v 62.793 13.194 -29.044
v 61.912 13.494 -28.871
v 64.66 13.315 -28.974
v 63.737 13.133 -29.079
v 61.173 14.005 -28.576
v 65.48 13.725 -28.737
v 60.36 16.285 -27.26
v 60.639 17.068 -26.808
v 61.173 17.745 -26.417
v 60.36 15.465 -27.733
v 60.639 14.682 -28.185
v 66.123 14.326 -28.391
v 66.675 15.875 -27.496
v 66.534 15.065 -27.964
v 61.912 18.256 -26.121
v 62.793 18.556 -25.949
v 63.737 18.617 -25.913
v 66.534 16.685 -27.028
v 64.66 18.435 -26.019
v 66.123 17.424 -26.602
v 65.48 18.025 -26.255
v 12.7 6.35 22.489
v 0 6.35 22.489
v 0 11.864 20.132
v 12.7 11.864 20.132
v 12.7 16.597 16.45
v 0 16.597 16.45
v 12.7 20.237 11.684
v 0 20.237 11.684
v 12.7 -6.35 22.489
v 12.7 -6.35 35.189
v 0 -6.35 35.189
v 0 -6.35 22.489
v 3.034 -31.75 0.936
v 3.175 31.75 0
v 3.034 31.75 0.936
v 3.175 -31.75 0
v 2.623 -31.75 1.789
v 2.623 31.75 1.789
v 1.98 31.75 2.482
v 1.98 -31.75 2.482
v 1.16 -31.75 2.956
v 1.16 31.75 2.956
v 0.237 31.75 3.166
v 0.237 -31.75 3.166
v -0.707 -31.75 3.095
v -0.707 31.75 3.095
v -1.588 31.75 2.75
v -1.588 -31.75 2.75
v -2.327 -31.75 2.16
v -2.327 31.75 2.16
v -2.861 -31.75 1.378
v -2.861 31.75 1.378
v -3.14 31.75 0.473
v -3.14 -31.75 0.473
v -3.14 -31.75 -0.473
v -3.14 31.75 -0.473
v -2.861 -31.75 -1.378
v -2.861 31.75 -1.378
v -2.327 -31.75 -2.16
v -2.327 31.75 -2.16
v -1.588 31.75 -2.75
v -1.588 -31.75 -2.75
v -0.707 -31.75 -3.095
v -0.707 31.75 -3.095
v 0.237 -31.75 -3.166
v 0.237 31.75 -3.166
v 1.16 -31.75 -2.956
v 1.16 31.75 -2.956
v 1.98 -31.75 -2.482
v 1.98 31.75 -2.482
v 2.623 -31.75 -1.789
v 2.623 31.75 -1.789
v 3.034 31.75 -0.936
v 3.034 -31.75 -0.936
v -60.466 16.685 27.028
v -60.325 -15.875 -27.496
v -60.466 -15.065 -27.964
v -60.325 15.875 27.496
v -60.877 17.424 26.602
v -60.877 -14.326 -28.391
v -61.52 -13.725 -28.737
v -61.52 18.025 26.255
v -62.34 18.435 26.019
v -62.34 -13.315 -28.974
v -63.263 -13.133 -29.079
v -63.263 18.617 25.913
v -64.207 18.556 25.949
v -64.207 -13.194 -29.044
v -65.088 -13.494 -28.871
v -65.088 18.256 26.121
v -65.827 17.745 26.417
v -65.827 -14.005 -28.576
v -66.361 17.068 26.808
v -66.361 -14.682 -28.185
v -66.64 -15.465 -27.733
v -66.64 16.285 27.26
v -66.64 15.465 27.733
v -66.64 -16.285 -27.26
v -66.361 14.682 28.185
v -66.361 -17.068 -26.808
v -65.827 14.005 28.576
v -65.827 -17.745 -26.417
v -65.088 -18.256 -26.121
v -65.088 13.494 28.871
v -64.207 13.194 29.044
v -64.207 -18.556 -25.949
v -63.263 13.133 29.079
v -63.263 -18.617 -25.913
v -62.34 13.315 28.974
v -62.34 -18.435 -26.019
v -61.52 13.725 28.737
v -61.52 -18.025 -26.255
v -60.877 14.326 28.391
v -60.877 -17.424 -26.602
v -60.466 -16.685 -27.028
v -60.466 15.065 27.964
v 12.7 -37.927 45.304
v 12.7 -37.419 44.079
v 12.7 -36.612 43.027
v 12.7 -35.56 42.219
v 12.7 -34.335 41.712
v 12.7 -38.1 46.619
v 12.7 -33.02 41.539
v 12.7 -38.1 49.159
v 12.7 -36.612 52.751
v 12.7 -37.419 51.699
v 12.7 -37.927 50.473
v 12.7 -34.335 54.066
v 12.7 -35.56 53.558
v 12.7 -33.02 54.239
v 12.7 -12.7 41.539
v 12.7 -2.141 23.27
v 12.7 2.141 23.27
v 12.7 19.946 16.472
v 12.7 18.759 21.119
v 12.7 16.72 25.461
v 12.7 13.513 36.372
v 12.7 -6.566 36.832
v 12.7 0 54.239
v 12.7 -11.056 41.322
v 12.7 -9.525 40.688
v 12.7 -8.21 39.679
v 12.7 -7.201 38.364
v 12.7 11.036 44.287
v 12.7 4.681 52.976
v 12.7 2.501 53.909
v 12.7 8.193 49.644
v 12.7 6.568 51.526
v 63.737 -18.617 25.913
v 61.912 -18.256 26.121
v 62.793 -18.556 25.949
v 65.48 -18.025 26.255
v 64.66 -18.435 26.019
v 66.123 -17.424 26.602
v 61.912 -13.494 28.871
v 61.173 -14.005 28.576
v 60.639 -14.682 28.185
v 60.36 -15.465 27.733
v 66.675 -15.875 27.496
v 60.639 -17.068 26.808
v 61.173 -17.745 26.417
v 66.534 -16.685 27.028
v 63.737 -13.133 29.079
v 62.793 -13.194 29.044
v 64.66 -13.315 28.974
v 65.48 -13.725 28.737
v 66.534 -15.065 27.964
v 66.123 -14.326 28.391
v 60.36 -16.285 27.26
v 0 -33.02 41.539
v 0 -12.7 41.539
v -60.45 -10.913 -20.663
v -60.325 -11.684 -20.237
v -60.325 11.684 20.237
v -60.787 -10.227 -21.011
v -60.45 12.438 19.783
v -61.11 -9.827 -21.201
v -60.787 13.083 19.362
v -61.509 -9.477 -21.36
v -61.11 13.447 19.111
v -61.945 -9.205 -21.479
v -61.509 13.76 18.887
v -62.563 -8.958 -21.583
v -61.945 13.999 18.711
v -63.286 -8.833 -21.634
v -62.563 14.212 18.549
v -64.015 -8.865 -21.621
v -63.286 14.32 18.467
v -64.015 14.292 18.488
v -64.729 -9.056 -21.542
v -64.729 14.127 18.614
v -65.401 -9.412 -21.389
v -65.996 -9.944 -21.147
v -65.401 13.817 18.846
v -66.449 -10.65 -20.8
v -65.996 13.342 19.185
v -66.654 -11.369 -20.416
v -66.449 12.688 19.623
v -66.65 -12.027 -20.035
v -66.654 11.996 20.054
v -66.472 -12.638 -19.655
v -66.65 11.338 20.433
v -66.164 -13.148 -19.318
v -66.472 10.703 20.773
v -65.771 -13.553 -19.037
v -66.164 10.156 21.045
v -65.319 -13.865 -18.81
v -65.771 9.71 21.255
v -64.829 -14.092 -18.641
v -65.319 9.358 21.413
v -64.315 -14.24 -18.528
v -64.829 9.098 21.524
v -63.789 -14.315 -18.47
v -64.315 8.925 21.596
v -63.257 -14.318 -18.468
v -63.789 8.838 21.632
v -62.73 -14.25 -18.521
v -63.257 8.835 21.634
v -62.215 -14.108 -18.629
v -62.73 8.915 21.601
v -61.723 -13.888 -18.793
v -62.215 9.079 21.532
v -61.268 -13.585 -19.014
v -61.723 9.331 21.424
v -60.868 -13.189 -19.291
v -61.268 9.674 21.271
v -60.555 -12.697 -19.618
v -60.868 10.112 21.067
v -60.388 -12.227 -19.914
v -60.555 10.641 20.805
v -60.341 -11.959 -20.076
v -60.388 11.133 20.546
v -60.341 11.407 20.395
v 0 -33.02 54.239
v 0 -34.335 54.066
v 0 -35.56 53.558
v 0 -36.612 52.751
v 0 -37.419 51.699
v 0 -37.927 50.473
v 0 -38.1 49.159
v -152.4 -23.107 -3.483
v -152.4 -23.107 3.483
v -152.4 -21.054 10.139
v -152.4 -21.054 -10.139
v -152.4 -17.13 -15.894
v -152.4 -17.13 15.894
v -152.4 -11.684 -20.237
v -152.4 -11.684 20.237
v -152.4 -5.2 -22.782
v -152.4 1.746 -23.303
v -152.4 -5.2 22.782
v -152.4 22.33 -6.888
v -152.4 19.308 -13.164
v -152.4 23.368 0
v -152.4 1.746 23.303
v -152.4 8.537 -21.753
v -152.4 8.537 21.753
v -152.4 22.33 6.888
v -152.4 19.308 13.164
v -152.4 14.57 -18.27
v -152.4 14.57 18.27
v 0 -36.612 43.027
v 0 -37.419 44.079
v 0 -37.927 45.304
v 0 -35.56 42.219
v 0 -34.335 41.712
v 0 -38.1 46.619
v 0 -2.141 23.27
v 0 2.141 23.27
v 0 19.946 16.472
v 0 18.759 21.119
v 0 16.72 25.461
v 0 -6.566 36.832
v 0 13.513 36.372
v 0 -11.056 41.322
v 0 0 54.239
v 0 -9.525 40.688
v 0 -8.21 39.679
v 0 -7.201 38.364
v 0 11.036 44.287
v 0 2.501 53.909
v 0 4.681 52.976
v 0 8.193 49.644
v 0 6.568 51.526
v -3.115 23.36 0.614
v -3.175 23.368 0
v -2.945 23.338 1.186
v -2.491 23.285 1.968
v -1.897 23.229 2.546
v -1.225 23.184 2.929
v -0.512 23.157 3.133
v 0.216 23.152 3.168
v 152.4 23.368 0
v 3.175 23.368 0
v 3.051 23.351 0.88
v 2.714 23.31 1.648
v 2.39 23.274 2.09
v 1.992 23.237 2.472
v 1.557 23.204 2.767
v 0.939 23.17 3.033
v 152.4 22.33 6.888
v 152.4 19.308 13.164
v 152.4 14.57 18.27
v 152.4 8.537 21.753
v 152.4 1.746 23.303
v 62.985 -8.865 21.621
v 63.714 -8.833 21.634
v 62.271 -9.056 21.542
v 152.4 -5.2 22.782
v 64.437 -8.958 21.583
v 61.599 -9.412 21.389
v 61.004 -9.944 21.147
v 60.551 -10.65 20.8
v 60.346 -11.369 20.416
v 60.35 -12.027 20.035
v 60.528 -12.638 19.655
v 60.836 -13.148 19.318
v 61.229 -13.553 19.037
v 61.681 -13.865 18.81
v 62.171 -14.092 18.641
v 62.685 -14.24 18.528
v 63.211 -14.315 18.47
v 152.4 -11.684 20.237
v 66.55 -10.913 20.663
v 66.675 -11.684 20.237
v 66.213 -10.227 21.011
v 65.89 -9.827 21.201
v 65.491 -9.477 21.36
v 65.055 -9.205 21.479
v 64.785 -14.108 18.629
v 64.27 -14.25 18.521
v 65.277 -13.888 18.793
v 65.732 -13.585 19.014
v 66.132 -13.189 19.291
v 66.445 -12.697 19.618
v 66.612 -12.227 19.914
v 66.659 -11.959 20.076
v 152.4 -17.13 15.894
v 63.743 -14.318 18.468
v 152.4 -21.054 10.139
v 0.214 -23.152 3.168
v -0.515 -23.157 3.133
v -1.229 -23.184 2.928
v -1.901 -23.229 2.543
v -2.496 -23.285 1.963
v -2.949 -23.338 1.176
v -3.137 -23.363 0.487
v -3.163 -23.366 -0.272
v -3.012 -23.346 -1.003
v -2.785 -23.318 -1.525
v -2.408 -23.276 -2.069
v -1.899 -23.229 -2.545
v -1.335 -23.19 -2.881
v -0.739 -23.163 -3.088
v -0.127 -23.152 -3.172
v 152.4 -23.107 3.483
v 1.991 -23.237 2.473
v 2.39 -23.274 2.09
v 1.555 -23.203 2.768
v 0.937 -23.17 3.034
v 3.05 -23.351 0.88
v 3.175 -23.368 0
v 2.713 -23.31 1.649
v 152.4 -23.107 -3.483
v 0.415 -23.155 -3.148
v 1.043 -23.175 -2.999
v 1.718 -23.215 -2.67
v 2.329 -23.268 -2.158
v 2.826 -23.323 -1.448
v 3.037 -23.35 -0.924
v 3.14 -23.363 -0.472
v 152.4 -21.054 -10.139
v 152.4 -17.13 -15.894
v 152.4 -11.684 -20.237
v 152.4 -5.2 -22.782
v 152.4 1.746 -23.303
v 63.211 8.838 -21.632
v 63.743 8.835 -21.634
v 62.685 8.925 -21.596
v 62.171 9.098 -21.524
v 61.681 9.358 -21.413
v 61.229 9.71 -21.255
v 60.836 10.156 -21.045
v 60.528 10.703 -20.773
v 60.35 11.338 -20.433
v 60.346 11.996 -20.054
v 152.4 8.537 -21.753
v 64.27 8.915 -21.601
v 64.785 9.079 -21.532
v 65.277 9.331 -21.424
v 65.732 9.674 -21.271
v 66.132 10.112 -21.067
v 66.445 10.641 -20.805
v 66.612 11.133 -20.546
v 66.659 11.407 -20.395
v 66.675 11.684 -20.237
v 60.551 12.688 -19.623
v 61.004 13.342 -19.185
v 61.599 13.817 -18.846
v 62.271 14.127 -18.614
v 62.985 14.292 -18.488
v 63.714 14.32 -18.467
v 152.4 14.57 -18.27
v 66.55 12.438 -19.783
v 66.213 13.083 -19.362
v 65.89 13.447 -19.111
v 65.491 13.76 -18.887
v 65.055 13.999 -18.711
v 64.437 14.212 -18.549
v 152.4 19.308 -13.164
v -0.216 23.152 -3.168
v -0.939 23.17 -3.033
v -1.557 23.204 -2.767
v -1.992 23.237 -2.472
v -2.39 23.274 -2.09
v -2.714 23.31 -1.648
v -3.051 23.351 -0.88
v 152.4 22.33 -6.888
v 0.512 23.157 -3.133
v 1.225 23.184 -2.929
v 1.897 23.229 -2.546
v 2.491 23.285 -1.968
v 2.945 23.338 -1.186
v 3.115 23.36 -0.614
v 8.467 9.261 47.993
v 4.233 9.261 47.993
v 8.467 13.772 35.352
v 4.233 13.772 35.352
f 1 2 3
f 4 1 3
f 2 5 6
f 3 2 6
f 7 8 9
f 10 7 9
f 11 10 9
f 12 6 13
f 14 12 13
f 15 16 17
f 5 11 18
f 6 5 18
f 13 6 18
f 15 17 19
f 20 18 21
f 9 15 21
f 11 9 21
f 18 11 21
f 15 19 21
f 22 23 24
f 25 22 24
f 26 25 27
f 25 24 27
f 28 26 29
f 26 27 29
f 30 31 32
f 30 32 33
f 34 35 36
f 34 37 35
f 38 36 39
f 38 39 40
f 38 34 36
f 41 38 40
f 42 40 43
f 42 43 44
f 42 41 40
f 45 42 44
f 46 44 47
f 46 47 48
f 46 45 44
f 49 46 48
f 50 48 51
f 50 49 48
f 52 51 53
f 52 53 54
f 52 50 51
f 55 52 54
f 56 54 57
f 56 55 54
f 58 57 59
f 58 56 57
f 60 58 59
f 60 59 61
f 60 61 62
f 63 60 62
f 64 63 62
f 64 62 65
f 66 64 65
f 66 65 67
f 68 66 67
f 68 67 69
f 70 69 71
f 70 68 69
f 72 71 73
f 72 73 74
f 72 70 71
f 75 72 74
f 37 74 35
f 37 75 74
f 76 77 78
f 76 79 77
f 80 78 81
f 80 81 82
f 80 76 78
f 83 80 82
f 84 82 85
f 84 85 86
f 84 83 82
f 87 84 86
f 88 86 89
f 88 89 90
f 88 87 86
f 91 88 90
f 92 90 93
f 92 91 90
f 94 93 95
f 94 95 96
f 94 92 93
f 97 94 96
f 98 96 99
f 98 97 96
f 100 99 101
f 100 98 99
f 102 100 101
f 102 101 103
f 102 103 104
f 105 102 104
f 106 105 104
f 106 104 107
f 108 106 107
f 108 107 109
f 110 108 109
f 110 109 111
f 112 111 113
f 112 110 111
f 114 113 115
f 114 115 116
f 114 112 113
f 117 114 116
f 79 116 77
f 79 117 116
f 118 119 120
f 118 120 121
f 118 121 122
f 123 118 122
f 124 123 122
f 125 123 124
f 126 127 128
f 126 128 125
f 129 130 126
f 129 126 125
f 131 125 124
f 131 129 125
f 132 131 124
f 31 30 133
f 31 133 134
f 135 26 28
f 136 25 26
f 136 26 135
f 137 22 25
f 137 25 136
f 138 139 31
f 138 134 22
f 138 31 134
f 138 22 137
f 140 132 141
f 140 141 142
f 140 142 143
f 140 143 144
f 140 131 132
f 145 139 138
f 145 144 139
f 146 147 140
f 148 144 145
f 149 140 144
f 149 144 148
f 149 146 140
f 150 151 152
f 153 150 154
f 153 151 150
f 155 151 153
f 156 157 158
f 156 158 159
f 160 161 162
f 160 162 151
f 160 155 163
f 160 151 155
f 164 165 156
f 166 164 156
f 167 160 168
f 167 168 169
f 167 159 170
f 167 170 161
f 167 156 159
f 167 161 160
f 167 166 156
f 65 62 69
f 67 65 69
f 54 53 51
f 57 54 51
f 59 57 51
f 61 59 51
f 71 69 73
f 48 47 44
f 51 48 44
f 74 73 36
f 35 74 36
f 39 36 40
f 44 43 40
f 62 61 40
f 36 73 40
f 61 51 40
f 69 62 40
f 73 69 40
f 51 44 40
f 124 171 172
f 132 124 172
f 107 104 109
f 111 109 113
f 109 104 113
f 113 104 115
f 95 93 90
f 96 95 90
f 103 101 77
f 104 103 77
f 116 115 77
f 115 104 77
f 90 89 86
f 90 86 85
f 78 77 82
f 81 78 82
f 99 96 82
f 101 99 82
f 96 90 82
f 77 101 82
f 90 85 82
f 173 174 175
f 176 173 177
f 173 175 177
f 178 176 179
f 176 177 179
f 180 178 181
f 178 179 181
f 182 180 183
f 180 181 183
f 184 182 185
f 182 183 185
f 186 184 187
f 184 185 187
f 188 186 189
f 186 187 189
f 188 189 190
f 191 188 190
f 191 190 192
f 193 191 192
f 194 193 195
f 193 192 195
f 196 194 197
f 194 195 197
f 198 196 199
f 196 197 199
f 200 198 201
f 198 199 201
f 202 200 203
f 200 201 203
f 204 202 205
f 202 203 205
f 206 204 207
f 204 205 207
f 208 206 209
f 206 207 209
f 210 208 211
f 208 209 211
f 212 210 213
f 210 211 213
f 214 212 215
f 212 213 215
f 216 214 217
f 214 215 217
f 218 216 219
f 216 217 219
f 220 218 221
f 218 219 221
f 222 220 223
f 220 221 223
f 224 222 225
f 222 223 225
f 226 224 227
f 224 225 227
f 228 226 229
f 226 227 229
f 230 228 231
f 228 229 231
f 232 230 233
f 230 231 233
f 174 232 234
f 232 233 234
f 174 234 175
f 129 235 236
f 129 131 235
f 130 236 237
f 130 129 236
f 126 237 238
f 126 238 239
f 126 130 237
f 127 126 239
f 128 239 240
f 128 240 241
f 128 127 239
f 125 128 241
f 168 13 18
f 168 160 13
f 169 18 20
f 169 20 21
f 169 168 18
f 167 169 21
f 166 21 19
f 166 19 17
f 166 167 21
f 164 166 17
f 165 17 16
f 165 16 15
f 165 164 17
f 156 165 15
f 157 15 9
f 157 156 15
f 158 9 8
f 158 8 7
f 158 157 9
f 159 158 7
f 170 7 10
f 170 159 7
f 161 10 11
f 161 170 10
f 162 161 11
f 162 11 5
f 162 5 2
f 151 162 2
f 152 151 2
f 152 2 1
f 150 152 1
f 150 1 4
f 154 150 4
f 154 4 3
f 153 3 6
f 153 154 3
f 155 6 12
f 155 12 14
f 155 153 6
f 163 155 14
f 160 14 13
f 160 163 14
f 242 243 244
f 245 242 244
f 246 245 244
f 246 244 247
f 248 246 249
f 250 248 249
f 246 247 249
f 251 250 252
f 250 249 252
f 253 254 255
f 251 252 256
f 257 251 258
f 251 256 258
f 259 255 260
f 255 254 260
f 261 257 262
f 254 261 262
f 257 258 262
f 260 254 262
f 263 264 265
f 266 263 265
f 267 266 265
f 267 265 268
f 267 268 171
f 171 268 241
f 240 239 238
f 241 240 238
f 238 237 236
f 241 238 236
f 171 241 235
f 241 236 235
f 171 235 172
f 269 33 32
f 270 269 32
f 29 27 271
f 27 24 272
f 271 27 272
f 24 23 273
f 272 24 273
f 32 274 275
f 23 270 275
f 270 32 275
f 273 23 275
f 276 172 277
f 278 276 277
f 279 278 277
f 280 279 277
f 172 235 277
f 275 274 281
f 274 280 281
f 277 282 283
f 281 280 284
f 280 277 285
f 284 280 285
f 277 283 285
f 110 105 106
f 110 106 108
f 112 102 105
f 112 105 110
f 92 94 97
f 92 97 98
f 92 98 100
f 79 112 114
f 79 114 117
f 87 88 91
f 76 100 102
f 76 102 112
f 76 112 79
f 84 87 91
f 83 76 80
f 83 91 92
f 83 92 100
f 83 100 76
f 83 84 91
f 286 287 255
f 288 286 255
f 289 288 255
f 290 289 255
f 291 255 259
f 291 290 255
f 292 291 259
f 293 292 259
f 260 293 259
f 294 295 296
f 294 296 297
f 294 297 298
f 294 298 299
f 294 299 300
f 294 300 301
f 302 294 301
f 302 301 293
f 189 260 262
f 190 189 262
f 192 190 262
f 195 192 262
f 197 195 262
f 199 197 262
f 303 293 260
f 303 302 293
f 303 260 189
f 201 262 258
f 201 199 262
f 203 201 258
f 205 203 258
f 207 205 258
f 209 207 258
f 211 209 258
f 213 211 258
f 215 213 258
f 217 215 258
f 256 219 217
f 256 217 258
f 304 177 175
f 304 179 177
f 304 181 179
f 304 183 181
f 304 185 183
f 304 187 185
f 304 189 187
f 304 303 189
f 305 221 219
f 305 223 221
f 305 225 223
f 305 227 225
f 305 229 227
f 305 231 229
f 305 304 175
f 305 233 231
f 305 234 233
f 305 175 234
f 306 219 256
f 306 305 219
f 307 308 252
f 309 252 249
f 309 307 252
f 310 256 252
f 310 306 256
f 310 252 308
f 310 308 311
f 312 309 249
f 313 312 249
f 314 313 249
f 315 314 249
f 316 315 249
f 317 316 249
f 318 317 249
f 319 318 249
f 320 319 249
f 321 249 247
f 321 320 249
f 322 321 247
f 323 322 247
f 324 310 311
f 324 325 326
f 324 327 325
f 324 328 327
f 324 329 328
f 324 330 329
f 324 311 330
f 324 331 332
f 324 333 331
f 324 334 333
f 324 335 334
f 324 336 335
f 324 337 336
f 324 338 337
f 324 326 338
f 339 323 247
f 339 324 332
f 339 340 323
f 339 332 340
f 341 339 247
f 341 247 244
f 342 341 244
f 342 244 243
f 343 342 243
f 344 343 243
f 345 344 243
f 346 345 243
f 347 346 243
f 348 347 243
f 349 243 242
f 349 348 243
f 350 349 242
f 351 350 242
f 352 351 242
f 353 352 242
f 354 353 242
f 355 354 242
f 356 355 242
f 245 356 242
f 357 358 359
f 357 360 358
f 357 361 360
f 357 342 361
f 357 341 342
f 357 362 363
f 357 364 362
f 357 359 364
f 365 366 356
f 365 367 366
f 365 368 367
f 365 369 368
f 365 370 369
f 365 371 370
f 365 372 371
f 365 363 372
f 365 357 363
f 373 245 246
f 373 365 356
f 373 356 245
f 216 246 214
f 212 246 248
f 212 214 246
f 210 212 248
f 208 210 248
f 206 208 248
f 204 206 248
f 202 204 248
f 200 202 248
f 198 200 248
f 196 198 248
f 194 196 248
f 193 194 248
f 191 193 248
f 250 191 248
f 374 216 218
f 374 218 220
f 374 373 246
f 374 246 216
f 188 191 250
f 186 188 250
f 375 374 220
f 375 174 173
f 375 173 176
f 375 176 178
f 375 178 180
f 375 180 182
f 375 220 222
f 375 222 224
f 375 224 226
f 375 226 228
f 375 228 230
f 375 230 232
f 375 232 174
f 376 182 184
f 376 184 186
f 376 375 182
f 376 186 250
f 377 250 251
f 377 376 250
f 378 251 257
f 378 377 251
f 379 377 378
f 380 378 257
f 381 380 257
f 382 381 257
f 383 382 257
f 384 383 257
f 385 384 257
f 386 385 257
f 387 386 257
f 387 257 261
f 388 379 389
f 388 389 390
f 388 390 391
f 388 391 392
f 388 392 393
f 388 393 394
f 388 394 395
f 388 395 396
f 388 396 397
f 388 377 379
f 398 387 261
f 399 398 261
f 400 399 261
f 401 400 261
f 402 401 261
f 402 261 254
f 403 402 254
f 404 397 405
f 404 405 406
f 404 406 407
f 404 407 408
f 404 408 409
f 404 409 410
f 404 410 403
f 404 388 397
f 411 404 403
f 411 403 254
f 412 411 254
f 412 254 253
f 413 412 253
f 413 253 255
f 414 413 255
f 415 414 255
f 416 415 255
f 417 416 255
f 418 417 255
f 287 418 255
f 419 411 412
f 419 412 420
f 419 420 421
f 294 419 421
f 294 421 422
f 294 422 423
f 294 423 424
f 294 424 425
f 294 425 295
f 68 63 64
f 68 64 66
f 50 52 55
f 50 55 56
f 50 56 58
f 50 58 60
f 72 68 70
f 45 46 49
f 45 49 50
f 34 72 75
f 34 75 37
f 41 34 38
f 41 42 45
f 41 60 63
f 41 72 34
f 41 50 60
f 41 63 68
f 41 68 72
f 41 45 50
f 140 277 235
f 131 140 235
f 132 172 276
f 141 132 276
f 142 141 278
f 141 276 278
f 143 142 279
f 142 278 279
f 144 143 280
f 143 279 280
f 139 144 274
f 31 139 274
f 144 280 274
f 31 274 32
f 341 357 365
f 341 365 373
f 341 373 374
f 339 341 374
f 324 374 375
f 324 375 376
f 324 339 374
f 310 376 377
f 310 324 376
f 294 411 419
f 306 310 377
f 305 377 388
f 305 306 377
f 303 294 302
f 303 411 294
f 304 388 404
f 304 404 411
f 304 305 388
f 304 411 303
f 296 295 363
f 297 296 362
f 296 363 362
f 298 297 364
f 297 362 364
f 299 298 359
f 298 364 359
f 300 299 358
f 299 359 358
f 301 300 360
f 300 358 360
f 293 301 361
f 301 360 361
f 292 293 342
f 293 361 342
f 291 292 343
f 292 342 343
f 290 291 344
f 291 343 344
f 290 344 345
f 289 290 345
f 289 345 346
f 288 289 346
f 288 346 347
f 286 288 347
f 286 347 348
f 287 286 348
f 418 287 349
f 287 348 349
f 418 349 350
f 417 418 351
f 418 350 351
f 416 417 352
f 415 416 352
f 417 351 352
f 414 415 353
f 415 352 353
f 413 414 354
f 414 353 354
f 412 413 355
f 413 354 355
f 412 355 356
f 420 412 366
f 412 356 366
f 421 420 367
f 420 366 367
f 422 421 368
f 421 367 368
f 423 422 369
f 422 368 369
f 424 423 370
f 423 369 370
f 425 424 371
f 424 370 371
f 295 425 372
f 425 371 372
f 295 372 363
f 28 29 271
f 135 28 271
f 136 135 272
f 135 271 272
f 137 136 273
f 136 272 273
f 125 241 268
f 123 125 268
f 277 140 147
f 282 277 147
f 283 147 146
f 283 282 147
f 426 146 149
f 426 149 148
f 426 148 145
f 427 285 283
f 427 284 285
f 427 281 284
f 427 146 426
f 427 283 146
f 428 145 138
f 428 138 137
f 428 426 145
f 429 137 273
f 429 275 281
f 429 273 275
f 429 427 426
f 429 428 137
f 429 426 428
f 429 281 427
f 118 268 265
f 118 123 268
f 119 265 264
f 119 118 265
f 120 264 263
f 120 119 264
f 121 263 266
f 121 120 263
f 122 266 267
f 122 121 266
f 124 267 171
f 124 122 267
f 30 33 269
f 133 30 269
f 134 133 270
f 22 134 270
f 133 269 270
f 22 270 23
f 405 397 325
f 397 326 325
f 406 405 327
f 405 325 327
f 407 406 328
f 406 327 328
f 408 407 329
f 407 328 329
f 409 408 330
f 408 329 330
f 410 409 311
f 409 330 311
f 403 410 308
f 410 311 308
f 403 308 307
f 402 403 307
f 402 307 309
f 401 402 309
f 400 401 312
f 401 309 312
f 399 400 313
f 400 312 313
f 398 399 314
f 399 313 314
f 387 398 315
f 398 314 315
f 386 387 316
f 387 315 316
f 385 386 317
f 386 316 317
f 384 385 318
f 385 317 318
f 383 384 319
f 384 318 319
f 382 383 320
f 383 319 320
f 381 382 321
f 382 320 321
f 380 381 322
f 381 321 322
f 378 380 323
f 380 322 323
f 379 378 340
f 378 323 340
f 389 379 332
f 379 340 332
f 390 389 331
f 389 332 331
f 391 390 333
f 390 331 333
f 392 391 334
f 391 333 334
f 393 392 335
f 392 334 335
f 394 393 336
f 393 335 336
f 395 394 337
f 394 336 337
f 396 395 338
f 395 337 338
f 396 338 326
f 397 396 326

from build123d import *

# Parameters (mm, degrees)
F1_R      = 23.368
F4_DEPTH  = 152.4
F5_R      = 3.175
F8_DEPTH  = 25.4
F7_R      = 3.175
F9_DEPTH  = 25.4
F6_R      = 3.175
F10_DEPTH = 25.4
F11_DEPTH = 31.75
F12_DEPTH = 31.75
F13_DEPTH = 31.75
F15_DEPTH = 12.7
F16_R     = 5.08


# Not quite as in the source:
# - a variable given as a bare number and used for a length is read in inches; the dataset says mm whatever the document's units were


with BuildPart() as f4:
    # F1 (on Right) → F4 (new body, symmetric)
    with BuildSketch(Plane.YZ):
        Circle(F1_R)
    extrude(amount=F4_DEPTH, both=True)

    # F5 (on Front) → F8 (cut, symmetric)
    with BuildSketch(Plane.XZ):
        Circle(F5_R)
    extrude(amount=F8_DEPTH, both=True, mode=Mode.SUBTRACT)

    # F7 (on face) → F9 (cut, symmetric)
    with BuildSketch(Plane(origin=(0, 0, 0), x_dir=(1, 0, 0), z_dir=(0, -0.5, 0.8660254038))):
        with Locations((63.5, 0)):
            Circle(F7_R)
    extrude(amount=F9_DEPTH, both=True, mode=Mode.SUBTRACT)

    # F6 (on face) → F10 (cut, symmetric)
    with BuildSketch(Plane(origin=(0, 0, 0), x_dir=(1, 0, 0), z_dir=(0, 0.5, 0.8660254038))):
        with Locations((-63.5, 0)):
            Circle(F6_R)
    extrude(amount=F10_DEPTH, both=True, mode=Mode.SUBTRACT)


with BuildPart() as f11:
    # F6 (on face) → F11 (new body, symmetric)
    with BuildSketch(Plane(origin=(0, 0, 0), x_dir=(1, 0, 0), z_dir=(0, 0.5, 0.8660254038))):
        with Locations((-63.5, 0)):
            Circle(F6_R)
    extrude(amount=F11_DEPTH, both=True)


with BuildPart() as f12:
    # F5 (on Front) → F12 (new body, symmetric)
    with BuildSketch(Plane.XZ):
        Circle(F5_R)
    extrude(amount=F12_DEPTH, both=True)


with BuildPart() as f13:
    # F7 (on face) → F13 (new body, symmetric)
    with BuildSketch(Plane(origin=(0, 0, 0), x_dir=(1, 0, 0), z_dir=(0, -0.5, 0.8660254038))):
        with Locations((63.5, 0)):
            Circle(F7_R)
    extrude(amount=F13_DEPTH, both=True)


with BuildPart() as f15:
    # F14 (on Right) → F15 (new body)
    with BuildSketch(Plane.YZ):
        with BuildLine():
            Line((-6.35, 35.1886843546), (-6.35, 22.4886843546))
            ThreePointArc((-6.35, 22.4886843546), (0, 23.368), (6.35, 22.4886843546))
            Line((6.35, 22.4886843546), (6.35, 35.1886843546))
            ThreePointArc((6.35, 35.1886843546), (12.2295840817, 31.0651383233), (16.7200072547, 25.460743568))
            add(Edge.make_bspline(
                [(0, 54.2386843546), (12.7, 54.2386843546), (13.4898950697, 30.9278154783), (16.7200072547, 25.460743568)],
                knots=[0, 0, 0, 0, 33.2825557689, 33.2825557689, 33.2825557689, 33.2825557689], degree=3))
            Line((0, 54.2386843546), (-38.1, 54.2386843546))
            Line((-38.1, 54.2386843546), (-38.1, 41.5386843546))
            Line((-38.1, 41.5386843546), (-12.7, 41.5386843546))
            ThreePointArc((-12.7, 41.5386843546), (-8.2098719395, 39.6788124151), (-6.35, 35.1886843546))
        make_face()
        with BuildLine():
            ThreePointArc((6.35, 22.4886843546), (14.3494315983, 18.4433521033), (20.2372816356, 11.684))
            ThreePointArc((20.2372816356, 11.684), (19.4623116998, 18.823507157), (16.7200072547, 25.460743568))
            ThreePointArc((16.7200072547, 25.460743568), (12.2295840817, 31.0651383233), (6.35, 35.1886843546))
            Line((6.35, 35.1886843546), (6.35, 22.4886843546))
        make_face()
    extrude(amount=F15_DEPTH)

    # F16
    f16_edges = [f15.edges().sort_by_distance(p)[0] for p in [
        (6.35, -38.1, 54.238684),
        (6.35, -38.1, 41.538684),
    ]]
    fillet(f16_edges, radius=F16_R)


solid = Compound([f4.part, f11.part, f12.part, f13.part, f15.part])
